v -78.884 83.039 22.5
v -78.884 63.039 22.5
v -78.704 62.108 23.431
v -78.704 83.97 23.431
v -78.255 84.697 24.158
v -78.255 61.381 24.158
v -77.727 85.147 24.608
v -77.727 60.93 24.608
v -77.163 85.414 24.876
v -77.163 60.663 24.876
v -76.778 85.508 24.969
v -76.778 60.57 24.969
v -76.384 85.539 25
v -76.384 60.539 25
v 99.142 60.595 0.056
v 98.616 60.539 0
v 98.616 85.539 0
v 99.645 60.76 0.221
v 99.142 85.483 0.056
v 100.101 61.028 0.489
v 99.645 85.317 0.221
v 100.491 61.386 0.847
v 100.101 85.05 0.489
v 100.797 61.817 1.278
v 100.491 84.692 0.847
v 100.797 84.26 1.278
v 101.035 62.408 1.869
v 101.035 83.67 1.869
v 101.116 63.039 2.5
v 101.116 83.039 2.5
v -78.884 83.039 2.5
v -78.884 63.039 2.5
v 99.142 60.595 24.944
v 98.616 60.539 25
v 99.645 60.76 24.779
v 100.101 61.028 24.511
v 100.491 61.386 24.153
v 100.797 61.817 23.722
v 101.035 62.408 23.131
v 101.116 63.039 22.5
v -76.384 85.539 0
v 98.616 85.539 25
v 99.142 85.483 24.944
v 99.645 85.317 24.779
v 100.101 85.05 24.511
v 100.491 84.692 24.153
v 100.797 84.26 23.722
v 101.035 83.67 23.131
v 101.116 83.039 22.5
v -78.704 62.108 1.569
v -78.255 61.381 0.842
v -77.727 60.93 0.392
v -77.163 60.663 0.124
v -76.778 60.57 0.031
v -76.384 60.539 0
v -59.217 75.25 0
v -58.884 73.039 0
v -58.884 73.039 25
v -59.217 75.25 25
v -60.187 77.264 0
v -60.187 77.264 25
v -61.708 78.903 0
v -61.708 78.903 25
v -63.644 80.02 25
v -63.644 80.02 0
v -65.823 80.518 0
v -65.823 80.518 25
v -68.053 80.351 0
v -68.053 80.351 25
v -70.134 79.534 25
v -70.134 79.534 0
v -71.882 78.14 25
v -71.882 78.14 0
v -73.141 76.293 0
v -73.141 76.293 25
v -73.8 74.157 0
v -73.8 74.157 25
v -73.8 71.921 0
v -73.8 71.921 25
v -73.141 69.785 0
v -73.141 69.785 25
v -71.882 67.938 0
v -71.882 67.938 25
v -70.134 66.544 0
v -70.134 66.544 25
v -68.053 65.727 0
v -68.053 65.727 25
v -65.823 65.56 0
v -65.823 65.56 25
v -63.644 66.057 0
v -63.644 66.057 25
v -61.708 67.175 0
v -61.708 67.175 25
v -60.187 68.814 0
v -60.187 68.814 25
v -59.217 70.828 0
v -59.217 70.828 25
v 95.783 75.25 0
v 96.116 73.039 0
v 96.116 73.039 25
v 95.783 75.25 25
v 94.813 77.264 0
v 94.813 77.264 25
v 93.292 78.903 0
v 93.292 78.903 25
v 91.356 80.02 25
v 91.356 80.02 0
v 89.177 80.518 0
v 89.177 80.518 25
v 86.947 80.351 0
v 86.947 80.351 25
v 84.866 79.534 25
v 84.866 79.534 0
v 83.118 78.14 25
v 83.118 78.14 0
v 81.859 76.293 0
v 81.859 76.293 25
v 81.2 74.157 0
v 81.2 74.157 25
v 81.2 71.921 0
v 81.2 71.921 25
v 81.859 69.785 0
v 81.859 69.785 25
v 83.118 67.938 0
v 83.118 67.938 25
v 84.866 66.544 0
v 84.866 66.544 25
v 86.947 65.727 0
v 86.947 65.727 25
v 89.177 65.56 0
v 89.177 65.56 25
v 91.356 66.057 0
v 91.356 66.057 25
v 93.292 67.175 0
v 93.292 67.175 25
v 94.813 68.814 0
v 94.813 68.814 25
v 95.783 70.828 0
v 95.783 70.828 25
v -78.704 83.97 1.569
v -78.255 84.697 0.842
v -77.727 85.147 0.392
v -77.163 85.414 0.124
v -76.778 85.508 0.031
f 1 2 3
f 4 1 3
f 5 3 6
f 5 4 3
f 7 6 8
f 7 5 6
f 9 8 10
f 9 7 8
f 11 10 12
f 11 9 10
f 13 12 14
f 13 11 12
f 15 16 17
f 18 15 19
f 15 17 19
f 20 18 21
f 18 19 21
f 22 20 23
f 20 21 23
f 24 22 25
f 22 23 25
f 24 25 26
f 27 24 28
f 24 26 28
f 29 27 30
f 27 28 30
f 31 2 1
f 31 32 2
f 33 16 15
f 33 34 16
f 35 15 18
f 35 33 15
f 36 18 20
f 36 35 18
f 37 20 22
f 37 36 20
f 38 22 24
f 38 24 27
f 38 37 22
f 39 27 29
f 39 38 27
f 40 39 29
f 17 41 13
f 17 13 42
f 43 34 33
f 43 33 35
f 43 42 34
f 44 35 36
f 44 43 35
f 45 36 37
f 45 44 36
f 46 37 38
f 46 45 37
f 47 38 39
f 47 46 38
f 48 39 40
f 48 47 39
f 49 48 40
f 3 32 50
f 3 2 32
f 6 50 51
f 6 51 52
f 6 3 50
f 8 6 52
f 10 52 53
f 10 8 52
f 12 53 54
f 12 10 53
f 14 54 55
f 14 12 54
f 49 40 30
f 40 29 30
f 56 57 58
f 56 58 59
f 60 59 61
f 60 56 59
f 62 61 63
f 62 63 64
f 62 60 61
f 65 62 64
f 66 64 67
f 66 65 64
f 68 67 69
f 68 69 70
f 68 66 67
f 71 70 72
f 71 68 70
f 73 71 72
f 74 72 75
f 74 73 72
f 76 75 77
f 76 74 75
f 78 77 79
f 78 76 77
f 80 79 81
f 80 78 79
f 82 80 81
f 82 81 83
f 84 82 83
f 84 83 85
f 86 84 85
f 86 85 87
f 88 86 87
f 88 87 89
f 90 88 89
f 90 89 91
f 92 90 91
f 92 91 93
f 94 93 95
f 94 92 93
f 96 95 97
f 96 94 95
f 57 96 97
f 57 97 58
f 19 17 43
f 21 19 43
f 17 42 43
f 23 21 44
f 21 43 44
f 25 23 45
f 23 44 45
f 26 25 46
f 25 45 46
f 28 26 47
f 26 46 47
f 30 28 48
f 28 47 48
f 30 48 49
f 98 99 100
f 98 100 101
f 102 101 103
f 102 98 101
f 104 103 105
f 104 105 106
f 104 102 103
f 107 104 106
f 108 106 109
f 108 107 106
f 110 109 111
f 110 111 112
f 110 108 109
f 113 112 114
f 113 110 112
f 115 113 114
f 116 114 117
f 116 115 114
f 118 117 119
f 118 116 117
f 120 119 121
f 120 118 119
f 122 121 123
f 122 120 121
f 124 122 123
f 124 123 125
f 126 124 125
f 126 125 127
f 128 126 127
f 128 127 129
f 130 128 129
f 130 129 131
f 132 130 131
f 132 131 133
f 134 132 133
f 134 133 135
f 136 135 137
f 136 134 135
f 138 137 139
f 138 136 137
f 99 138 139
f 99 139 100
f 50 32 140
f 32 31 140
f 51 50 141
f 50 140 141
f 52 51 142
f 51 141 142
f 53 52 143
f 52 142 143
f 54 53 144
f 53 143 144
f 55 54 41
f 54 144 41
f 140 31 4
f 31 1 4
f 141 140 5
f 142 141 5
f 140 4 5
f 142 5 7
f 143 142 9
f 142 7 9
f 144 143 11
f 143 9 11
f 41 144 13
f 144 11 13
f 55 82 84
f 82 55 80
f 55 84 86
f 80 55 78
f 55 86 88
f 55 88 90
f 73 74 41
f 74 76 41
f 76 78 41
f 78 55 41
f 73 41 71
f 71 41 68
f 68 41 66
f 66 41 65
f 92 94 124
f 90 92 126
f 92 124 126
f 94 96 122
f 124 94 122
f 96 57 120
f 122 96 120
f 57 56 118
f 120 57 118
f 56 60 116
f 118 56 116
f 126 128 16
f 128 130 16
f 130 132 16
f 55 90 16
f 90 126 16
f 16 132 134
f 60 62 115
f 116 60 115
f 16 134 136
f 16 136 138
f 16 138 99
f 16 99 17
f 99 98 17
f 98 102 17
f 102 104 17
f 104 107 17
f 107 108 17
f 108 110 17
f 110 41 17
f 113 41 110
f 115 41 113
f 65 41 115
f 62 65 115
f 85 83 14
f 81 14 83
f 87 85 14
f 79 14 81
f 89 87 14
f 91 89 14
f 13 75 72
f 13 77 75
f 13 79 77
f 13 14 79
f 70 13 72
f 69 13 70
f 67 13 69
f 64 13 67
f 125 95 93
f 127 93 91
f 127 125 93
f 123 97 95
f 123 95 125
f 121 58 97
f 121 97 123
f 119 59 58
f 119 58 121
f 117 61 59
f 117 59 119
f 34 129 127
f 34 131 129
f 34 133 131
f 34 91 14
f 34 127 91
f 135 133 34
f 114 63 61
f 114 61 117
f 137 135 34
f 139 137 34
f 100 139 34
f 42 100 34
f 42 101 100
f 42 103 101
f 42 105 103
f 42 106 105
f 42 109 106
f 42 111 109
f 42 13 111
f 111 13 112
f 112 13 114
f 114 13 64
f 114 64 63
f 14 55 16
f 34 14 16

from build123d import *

# Parameters (mm, degrees)
SKETCH1_W           = 180
SKETCH1_H           = 25
SKETCH1_R           = 7.5
BOSS_EXTRUDE1_DEPTH = 25
FILLET1_R           = 2.5
FILLET2_R           = 2.5


with BuildPart() as part:
    # Sketch1 → Boss-Extrude1 (new body)
    with BuildSketch(Plane.XY):
        with Locations((11.116046254, 73.038881715)):
            Rectangle(SKETCH1_W, SKETCH1_H)
        with Locations((-66.383953746, 73.038881715)):
            Circle(SKETCH1_R, mode=Mode.SUBTRACT)
        with Locations((88.616046254, 73.038881715)):
            Circle(SKETCH1_R, mode=Mode.SUBTRACT)
    extrude(amount=BOSS_EXTRUDE1_DEPTH)

    # Fillet1
    fillet1_edges = [part.edges().sort_by_distance(p)[0] for p in [
        (-78.883953746, 73.038881715, 25),
        (-78.883953746, 73.038881715, 0),
        (-78.883953746, 85.538881715, 12.5),
        (-78.883953746, 60.538881715, 12.5),
    ]]
    fillet(fillet1_edges, radius=FILLET1_R)

    # Fillet2
    fillet2_edges = [part.edges().sort_by_distance(p)[0] for p in [
        (101.116046254, 73.038881715, 25),
        (101.116046254, 73.038881715, 0),
        (101.116046254, 85.538881715, 12.5),
        (101.116046254, 60.538881715, 12.5),
    ]]
    fillet(fillet2_edges, radius=FILLET2_R)


solid = part.part
